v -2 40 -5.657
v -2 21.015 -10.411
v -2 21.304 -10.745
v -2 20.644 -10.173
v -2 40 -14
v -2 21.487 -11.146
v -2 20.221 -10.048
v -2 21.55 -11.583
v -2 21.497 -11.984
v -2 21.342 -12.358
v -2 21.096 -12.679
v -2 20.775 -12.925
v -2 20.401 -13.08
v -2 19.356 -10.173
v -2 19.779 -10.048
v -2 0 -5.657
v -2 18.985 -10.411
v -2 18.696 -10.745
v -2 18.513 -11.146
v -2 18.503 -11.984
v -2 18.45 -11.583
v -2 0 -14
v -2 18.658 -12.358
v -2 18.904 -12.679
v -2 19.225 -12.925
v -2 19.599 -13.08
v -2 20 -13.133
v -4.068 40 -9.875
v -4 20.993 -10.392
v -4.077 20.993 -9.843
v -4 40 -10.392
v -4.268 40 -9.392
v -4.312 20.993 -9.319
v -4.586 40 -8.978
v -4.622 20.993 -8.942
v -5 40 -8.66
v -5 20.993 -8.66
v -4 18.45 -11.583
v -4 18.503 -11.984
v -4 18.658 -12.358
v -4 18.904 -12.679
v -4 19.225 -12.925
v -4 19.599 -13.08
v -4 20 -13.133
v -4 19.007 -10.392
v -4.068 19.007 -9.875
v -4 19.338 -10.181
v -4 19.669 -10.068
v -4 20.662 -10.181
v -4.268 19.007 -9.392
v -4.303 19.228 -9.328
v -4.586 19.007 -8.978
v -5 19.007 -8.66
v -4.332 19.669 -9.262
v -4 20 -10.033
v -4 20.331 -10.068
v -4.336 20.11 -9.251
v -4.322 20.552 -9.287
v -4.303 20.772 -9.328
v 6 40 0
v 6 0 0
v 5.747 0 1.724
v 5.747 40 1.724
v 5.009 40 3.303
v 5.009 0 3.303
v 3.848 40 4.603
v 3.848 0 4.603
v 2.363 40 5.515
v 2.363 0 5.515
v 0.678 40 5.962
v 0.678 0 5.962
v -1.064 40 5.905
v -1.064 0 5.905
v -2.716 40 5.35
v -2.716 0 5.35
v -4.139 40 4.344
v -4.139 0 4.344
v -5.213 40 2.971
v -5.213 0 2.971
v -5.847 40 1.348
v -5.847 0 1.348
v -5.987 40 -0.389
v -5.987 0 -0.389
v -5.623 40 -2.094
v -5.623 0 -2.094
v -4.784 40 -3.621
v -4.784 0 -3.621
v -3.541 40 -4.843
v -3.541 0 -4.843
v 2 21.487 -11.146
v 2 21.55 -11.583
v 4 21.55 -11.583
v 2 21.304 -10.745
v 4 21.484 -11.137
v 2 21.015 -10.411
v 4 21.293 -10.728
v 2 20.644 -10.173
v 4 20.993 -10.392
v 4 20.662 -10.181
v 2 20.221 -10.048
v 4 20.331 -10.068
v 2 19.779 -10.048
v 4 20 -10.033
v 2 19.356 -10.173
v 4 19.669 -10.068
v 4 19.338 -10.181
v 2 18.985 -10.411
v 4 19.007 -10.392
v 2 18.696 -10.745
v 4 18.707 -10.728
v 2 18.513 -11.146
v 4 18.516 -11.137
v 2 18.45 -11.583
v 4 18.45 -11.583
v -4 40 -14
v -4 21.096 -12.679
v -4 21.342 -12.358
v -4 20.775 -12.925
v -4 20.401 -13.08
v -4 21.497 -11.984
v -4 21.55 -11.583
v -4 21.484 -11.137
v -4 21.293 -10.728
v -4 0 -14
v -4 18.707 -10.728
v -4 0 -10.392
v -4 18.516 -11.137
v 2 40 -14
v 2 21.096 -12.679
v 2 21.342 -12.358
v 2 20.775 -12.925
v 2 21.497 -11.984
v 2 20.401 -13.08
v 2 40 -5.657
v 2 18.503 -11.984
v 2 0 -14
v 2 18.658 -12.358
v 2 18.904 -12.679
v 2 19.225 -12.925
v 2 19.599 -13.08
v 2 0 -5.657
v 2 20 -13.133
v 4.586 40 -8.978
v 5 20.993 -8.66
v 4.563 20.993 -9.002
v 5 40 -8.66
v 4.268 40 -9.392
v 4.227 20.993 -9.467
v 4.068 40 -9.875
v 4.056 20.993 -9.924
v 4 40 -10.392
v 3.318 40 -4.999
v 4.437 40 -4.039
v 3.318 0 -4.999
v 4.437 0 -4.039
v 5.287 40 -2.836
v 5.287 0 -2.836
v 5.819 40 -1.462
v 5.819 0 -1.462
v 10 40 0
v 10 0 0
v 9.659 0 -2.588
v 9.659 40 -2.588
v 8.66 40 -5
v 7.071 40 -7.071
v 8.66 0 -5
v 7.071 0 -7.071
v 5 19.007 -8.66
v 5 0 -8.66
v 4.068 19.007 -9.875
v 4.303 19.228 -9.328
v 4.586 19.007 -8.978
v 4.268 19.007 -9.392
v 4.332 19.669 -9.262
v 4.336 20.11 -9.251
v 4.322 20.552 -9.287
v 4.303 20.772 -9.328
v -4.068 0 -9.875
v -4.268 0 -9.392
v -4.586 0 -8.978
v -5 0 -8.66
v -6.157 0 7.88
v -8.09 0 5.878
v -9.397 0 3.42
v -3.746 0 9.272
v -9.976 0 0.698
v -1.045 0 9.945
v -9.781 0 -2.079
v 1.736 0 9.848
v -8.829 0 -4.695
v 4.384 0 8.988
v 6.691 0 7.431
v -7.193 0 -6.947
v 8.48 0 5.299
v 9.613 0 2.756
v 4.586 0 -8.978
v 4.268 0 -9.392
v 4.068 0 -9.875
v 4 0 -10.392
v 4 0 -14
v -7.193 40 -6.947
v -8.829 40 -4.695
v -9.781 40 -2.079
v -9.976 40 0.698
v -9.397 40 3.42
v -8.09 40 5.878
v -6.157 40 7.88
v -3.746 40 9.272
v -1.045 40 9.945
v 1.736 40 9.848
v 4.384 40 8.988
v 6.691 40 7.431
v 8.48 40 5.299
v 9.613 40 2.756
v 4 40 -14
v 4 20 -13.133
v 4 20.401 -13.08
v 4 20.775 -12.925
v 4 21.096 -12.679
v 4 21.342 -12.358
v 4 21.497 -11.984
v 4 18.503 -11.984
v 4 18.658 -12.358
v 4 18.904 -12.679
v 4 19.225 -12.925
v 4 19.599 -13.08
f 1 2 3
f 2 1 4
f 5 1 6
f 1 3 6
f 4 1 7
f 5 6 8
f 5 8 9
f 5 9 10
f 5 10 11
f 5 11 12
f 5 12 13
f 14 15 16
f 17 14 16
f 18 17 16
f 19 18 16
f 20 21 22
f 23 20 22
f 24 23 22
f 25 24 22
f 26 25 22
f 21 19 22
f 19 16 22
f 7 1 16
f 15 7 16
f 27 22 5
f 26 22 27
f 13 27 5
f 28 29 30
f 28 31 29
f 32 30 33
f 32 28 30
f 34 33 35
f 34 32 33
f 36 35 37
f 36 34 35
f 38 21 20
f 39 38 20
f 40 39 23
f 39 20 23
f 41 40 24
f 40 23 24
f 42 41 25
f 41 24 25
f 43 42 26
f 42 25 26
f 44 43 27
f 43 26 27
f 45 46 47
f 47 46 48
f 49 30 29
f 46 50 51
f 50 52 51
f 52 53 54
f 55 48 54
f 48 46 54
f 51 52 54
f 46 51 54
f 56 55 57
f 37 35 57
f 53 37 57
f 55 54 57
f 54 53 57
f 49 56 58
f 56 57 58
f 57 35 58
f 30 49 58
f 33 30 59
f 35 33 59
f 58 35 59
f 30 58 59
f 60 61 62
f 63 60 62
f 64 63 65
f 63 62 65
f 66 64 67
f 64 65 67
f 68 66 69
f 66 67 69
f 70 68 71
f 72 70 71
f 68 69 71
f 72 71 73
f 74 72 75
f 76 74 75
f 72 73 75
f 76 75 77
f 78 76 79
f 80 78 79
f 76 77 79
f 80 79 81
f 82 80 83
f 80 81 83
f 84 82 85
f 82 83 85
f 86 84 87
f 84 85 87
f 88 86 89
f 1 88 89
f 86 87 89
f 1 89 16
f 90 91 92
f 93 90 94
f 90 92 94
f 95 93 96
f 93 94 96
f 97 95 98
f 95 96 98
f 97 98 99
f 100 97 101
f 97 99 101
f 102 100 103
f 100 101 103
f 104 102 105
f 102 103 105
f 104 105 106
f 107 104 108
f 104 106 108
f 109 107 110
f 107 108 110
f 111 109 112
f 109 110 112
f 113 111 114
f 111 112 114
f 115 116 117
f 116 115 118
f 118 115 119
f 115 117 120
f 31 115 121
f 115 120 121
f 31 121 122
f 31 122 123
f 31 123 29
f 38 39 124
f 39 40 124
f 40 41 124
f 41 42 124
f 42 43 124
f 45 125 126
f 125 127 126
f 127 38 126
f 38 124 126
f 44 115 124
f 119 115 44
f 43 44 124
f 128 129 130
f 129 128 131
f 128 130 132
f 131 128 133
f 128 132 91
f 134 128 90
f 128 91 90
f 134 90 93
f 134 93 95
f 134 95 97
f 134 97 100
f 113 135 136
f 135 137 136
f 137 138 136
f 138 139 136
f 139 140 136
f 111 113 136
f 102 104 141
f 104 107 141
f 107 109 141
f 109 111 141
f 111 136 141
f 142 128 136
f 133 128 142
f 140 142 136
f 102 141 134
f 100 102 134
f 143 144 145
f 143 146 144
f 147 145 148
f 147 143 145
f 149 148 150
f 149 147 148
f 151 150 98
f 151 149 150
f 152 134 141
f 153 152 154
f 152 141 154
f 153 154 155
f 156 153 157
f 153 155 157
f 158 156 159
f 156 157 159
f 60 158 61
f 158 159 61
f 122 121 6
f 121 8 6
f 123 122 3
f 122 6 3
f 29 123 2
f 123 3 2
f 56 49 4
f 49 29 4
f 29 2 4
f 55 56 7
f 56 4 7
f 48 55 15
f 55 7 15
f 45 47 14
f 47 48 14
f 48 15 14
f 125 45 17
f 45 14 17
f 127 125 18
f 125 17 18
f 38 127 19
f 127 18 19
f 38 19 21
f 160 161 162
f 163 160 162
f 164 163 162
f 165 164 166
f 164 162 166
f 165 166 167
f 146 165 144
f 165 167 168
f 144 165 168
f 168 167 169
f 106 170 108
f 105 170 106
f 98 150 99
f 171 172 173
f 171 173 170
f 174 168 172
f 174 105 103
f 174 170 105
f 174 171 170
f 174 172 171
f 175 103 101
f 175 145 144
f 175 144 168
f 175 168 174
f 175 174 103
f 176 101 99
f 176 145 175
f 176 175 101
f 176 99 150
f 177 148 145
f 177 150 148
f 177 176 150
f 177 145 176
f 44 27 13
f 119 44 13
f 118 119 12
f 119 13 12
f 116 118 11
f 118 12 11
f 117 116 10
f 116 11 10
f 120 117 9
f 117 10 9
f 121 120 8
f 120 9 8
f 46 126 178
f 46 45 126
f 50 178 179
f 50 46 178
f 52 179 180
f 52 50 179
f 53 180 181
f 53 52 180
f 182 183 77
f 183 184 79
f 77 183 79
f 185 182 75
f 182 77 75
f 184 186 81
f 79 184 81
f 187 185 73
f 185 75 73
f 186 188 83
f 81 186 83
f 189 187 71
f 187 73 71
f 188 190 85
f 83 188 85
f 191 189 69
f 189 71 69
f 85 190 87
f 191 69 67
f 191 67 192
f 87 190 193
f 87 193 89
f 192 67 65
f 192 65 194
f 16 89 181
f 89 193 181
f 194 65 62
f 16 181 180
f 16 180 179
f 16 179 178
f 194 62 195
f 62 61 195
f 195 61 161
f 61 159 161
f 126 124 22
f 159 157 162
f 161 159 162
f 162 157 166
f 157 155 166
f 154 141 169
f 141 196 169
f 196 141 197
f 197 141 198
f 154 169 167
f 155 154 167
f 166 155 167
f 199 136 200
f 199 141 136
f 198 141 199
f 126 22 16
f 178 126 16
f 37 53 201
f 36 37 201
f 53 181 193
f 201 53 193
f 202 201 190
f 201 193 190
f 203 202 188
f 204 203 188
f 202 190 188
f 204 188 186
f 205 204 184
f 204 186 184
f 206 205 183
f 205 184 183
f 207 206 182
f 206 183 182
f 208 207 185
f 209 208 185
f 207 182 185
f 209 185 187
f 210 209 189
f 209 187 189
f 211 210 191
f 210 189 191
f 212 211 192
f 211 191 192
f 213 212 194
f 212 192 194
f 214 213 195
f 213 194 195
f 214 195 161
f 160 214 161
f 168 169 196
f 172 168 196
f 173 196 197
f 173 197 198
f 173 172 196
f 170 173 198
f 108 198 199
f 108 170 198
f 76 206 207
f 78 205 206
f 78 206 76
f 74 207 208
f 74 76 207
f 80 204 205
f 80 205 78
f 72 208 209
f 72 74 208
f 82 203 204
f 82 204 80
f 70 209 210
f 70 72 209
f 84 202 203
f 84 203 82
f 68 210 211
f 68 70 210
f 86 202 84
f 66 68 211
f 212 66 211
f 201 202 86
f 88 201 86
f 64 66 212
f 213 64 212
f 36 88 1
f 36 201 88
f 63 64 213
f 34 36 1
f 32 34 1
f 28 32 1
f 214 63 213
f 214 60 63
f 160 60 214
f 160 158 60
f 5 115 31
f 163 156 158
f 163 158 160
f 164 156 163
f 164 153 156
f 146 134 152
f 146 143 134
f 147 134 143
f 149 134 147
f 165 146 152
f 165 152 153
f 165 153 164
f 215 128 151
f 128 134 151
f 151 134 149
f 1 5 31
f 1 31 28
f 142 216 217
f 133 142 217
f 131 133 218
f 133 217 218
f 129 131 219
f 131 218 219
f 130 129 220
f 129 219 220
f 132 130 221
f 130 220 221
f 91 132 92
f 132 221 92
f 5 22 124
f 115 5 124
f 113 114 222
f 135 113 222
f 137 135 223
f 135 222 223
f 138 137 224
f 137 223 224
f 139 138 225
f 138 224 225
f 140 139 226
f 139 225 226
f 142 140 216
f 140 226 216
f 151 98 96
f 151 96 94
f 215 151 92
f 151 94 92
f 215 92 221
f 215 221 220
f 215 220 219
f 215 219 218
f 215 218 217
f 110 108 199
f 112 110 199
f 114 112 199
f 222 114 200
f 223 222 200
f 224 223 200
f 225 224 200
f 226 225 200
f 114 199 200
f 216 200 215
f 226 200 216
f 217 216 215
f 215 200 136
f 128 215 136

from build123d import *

# Parameters (mm, degrees)
BOSS_EXTRUDE4_DEPTH = 40
SKETCH2_R           = 1.55
CUT_EXTRUDE1_DEPTH  = 45.631827209
FILLET1_R           = 2


with BuildPart() as part:
    # Sketch1 → Boss-Extrude4 (new body)
    with BuildSketch(Plane(origin=(0, 0, 0), x_dir=(1, 0, 0), z_dir=(0, 1, 0))):
        with BuildLine():
            Line((-2, 14), (-4, 14))
            Line((-4, 14), (-4, 9.16515139))
            ThreePointArc((-4, 9.16515139), (0, -10), (4, 9.16515139))
            Line((4, 9.16515139), (4, 14))
            Line((4, 14), (2, 14))
            Line((2, 14), (2, 5.656854249))
            ThreePointArc((2, 5.656854249), (0, -6), (-2, 5.656854249))
            Line((-2, 5.656854249), (-2, 14))
        make_face()
    extrude(amount=BOSS_EXTRUDE4_DEPTH)

    # Sketch2 → Cut-Extrude1 (cut, through all)
    with BuildSketch(Plane(origin=(4, 0, 0), x_dir=(0, 0, -1), z_dir=(1, 0, 0))):
        with Locations((11.582575695, 20)):
            Circle(SKETCH2_R)
    extrude(amount=-CUT_EXTRUDE1_DEPTH, mode=Mode.SUBTRACT)

    # Fillet1
    fillet1_edges = [part.edges().sort_by_distance(p)[0] for p in [
        (4, 20, -9.16515139),
        (-4, 20, -9.16515139),
    ]]
    fillet(fillet1_edges, radius=FILLET1_R)


solid = part.part
